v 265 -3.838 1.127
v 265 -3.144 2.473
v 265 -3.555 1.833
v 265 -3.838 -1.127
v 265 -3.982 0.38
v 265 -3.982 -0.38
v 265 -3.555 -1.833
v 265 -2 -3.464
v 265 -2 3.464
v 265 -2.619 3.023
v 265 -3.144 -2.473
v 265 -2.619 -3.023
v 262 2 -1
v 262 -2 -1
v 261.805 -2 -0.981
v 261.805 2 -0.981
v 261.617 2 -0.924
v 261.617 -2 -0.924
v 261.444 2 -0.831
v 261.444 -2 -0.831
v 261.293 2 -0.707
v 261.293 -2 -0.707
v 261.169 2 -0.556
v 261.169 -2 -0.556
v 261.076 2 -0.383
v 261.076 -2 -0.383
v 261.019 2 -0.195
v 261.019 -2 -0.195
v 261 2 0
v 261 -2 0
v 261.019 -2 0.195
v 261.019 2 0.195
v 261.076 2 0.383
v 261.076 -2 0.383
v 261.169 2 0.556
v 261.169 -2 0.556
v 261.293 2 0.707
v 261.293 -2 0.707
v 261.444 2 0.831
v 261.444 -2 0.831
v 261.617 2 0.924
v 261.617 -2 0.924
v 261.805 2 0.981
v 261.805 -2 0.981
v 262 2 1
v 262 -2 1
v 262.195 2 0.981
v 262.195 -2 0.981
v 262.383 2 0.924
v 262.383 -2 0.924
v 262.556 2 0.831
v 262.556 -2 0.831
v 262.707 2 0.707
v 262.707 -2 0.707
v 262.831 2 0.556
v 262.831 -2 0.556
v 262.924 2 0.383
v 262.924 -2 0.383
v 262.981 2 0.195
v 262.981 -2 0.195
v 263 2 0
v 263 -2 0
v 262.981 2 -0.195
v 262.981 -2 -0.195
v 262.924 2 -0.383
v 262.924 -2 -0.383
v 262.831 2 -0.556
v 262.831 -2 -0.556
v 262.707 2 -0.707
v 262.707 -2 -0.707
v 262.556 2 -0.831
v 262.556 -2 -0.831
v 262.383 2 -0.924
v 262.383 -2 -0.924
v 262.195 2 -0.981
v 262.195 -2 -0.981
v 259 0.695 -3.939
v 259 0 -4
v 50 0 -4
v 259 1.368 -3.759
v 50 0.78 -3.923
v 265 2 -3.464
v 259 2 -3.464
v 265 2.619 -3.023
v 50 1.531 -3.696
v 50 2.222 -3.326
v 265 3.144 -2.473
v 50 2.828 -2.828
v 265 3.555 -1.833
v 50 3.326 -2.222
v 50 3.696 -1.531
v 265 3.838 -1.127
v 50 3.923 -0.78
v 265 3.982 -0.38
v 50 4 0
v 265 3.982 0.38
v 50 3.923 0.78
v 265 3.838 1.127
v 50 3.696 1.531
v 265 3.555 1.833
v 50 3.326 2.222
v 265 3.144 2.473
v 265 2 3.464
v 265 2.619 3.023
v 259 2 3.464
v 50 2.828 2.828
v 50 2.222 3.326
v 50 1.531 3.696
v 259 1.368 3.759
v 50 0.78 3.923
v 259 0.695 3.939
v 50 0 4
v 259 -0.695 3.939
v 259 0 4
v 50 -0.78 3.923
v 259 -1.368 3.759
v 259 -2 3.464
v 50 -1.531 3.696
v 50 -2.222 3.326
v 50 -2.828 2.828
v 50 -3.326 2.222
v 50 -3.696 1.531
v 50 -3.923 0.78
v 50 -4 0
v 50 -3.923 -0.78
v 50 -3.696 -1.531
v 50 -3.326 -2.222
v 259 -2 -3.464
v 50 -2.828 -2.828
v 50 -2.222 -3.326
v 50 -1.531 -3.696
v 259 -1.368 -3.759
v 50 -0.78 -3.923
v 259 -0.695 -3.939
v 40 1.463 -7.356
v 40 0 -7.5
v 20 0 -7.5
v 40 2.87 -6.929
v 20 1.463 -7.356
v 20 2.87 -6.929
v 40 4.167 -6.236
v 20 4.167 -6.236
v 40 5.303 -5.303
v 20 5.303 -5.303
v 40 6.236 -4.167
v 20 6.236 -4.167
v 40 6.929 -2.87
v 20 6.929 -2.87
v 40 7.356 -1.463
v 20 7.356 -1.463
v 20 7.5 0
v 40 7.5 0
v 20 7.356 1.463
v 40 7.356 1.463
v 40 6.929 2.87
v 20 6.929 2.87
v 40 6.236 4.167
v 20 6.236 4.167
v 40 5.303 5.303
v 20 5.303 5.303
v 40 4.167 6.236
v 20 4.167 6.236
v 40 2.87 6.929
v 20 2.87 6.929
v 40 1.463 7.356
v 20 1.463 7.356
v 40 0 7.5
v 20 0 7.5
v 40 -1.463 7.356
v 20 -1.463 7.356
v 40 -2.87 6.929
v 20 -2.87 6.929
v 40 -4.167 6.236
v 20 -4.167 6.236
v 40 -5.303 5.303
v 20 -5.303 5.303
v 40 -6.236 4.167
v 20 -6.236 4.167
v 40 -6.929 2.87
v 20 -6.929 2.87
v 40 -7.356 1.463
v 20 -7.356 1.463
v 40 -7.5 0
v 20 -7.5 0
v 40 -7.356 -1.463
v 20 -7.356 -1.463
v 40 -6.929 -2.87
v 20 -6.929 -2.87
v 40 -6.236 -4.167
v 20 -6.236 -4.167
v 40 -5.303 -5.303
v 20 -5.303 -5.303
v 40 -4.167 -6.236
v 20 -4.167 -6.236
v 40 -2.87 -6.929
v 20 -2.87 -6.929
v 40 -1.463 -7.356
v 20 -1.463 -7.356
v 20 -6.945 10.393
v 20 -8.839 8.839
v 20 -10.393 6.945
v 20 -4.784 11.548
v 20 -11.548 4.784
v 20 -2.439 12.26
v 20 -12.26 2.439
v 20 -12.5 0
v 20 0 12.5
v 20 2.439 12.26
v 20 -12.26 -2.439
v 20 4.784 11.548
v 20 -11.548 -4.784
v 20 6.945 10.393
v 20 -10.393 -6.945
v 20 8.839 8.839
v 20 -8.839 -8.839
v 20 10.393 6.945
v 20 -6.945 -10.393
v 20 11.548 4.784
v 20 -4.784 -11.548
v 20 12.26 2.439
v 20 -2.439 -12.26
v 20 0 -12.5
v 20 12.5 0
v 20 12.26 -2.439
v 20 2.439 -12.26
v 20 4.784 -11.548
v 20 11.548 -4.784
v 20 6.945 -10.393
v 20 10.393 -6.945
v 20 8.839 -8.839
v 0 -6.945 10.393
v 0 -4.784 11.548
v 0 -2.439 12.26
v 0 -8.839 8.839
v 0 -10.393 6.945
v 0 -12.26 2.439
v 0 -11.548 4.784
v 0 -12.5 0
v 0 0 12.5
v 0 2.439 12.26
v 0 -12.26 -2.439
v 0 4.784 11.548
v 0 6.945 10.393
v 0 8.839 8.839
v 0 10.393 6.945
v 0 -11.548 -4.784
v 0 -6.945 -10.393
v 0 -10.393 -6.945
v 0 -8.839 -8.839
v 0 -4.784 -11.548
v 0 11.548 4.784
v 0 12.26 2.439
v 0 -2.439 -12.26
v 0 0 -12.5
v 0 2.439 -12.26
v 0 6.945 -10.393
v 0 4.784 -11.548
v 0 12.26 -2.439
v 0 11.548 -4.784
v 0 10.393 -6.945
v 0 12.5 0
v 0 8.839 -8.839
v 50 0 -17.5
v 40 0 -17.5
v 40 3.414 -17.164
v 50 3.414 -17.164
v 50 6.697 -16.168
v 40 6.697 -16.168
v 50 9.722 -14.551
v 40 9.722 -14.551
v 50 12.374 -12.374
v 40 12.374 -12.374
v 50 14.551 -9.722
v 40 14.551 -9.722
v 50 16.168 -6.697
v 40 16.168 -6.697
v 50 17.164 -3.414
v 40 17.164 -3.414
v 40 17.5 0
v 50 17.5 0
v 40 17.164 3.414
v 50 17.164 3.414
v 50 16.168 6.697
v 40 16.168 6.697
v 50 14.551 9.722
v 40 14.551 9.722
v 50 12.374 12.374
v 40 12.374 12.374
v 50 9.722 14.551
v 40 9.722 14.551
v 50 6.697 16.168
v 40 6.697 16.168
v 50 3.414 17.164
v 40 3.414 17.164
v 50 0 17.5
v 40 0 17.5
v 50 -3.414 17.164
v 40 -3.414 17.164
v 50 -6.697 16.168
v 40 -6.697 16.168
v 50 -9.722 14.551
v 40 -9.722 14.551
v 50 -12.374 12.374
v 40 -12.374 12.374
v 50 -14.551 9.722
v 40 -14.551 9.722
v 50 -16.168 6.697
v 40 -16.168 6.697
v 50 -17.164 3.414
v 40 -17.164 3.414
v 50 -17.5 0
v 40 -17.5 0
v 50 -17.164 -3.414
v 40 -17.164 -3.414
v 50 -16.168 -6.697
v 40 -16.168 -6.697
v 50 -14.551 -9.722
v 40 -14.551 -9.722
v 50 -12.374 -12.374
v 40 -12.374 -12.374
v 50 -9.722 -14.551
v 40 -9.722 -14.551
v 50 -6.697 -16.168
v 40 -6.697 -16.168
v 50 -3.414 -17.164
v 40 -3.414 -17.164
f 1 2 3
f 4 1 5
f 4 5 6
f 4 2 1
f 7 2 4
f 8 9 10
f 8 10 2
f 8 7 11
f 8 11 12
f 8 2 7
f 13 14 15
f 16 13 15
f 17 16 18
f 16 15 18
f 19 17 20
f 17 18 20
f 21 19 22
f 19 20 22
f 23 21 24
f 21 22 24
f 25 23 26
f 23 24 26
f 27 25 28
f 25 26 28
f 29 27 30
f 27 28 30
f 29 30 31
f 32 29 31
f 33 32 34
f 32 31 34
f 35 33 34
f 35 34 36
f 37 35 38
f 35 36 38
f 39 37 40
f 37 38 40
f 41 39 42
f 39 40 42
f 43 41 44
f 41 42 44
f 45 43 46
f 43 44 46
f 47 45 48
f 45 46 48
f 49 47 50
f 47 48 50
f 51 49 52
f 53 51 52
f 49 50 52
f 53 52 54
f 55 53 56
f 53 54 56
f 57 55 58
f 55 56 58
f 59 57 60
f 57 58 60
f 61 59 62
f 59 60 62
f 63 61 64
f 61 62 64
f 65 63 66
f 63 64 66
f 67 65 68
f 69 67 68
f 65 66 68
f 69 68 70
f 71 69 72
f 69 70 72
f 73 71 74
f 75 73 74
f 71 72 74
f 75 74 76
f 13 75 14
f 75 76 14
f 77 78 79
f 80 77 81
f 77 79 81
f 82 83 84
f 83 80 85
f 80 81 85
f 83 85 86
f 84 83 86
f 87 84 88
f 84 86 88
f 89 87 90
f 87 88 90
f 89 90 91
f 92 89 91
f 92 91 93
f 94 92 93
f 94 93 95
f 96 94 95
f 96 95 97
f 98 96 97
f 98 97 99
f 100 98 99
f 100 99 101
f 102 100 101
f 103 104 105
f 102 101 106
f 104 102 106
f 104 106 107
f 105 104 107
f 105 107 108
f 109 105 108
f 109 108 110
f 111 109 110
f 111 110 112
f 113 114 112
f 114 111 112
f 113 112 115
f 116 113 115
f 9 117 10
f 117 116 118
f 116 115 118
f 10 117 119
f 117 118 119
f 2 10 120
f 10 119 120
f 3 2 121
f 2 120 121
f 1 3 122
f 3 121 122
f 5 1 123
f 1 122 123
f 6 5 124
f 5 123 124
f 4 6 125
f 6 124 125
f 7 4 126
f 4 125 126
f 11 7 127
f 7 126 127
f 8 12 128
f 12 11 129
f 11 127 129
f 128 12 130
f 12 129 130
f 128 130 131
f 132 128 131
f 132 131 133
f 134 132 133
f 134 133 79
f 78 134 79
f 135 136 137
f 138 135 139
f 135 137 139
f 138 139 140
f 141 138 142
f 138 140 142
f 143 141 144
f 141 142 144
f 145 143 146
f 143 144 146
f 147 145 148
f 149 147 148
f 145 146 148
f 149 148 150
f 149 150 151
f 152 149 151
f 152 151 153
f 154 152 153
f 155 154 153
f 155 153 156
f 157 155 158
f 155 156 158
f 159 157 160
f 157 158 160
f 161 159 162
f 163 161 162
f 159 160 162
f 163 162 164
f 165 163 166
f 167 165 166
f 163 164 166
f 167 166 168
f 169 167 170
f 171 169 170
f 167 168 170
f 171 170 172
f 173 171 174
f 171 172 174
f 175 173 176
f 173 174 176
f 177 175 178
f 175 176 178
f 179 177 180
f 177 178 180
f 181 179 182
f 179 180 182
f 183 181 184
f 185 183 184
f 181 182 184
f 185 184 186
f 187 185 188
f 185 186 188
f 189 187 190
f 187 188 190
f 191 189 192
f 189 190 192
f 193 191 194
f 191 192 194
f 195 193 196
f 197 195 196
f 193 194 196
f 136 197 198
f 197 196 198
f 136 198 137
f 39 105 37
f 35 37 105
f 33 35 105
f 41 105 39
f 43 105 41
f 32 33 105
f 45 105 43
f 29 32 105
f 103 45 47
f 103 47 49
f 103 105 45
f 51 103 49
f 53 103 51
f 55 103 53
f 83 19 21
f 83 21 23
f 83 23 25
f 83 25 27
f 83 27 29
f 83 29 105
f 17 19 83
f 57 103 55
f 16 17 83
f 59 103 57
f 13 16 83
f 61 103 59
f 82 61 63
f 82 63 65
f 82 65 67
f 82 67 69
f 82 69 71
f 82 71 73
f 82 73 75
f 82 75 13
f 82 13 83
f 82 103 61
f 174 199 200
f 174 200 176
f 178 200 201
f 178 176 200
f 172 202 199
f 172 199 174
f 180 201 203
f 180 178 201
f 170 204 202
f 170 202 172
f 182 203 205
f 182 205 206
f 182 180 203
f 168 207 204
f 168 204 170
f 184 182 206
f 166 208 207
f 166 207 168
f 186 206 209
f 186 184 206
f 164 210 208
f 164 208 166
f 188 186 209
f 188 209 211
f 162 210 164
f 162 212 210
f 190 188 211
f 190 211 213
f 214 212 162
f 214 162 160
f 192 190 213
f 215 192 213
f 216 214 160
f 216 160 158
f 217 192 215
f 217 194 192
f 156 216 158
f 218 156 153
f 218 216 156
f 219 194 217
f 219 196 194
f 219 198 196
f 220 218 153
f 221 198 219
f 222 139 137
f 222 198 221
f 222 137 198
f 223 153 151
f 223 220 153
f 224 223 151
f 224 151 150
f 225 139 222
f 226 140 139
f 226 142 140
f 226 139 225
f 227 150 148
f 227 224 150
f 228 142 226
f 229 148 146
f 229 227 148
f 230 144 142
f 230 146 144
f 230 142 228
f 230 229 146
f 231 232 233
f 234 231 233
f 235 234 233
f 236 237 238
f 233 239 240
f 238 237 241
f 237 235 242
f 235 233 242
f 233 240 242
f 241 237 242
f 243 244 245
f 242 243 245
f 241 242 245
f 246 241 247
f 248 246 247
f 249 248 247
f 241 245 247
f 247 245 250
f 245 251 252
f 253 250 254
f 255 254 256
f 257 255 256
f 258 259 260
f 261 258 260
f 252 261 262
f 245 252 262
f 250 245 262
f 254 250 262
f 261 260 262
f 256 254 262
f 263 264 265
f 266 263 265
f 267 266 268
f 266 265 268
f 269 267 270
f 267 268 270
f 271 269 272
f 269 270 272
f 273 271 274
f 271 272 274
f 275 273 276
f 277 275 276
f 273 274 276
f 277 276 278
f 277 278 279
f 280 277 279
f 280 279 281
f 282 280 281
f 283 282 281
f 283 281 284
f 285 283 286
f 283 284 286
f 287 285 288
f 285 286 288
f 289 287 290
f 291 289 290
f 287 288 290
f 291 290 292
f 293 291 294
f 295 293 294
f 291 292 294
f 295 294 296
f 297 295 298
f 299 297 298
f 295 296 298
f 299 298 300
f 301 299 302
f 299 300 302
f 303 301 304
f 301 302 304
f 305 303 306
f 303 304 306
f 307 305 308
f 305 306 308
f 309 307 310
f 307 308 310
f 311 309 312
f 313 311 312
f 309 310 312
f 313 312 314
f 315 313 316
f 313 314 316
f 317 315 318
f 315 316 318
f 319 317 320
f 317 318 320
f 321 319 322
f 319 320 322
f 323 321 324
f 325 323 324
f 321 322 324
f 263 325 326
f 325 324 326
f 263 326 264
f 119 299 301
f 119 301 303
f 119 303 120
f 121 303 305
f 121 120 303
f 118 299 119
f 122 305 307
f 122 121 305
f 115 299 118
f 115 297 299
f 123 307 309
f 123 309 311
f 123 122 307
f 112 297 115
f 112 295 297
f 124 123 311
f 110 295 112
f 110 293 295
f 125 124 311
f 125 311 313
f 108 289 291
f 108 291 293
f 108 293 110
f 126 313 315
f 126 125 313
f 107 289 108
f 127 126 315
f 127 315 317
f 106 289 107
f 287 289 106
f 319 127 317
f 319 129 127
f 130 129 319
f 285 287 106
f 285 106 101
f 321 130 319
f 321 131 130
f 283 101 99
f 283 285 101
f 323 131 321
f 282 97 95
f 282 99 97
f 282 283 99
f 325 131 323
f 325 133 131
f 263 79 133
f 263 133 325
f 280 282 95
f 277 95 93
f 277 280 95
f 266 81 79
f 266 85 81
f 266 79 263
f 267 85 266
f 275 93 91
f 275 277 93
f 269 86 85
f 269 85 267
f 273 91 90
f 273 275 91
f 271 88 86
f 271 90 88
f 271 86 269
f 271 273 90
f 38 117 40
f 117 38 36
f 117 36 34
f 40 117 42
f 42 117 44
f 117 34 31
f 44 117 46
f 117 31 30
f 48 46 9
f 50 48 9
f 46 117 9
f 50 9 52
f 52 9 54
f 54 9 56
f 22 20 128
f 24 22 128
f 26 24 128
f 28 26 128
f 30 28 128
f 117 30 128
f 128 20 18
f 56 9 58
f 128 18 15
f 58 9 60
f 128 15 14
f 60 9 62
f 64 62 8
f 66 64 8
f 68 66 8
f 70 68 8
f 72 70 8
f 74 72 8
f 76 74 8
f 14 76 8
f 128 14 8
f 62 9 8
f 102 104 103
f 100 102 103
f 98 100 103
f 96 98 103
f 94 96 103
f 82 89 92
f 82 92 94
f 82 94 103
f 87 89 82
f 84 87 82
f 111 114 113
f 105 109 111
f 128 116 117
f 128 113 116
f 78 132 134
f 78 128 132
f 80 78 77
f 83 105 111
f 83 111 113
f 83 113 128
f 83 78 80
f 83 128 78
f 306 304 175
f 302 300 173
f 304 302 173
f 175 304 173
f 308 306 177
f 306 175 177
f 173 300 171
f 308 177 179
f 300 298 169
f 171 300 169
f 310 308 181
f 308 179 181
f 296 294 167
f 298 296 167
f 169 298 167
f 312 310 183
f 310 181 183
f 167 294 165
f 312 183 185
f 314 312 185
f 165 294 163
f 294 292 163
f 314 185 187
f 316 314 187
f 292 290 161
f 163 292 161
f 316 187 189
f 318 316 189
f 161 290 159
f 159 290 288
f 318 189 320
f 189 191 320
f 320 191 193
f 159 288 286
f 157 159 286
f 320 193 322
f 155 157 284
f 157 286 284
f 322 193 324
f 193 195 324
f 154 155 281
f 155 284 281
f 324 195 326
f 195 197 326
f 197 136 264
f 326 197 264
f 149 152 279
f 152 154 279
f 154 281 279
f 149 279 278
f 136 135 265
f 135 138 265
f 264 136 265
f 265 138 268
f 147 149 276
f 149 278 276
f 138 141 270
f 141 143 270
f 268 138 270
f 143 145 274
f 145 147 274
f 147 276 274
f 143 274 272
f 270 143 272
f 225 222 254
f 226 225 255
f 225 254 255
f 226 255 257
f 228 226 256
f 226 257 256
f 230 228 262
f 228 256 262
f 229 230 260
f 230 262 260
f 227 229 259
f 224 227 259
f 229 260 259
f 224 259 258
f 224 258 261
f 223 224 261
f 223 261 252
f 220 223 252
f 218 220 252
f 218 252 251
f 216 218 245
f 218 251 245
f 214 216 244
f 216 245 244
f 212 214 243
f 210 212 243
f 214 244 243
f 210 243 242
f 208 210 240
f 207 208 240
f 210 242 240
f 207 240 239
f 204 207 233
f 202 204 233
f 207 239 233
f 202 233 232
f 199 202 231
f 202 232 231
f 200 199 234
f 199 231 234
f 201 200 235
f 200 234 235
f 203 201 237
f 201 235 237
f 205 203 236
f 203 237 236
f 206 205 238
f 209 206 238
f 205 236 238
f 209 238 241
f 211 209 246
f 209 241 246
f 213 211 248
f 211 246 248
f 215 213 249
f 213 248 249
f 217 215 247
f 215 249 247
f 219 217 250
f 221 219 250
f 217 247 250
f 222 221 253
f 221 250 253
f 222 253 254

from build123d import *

# Parameters (mm, degrees)
SKETCH1_R           = 12.5
BOSS_EXTRUDE1_DEPTH = 20
SKETCH2_R           = 7.5
BOSS_EXTRUDE2_DEPTH = 20
SKETCH3_R           = 17.5
BOSS_EXTRUDE3_DEPTH = 10
SKETCH4_R           = 4
BOSS_EXTRUDE4_DEPTH = 215
SKETCH5_W           = 12
SKETCH5_H           = 4
CUT_EXTRUDE1_DEPTH  = 6
SKETCH6_R           = 1
BOSS_EXTRUDE5_DEPTH = 4


with BuildPart() as part:
    # Sketch1 → Boss-Extrude1 (new body)
    with BuildSketch(Plane(origin=(0, 0, 0), x_dir=(0, 0, -1), z_dir=(1, 0, 0))):
        Circle(SKETCH1_R)
    extrude(amount=BOSS_EXTRUDE1_DEPTH)

    # Sketch2 → Boss-Extrude2 (add)
    with BuildSketch(Plane(origin=(20, 0, 0), x_dir=(0, 0, -1), z_dir=(1, 0, 0))):
        Circle(SKETCH2_R)
    extrude(amount=BOSS_EXTRUDE2_DEPTH)

    # Sketch3 → Boss-Extrude3 (add)
    with BuildSketch(Plane(origin=(40, 0, 0), x_dir=(0, 0, -1), z_dir=(1, 0, 0))):
        Circle(SKETCH3_R)
    extrude(amount=BOSS_EXTRUDE3_DEPTH)

    # Sketch4 → Boss-Extrude4 (add)
    with BuildSketch(Plane(origin=(50, 0, 0), x_dir=(0, 0, -1), z_dir=(1, 0, 0))):
        Circle(SKETCH4_R)
    extrude(amount=BOSS_EXTRUDE4_DEPTH)

    # Sketch5 → Cut-Extrude1 (cut)
    with BuildSketch(Plane(origin=(265, 0, 0), x_dir=(0, 0, -1), z_dir=(1, 0, 0))):
        Rectangle(SKETCH5_W, SKETCH5_H)
    extrude(amount=-CUT_EXTRUDE1_DEPTH, mode=Mode.SUBTRACT)

    # Sketch6 → Boss-Extrude5 (add)
    with BuildSketch(Plane(origin=(0, -2, 0), x_dir=(1, 0, 0), z_dir=(0, 1, 0))):
        with Locations(Location((262, 0, 0), (0, 0, 90))):
            Circle(SKETCH6_R)
    extrude(amount=BOSS_EXTRUDE5_DEPTH)


solid = part.part
